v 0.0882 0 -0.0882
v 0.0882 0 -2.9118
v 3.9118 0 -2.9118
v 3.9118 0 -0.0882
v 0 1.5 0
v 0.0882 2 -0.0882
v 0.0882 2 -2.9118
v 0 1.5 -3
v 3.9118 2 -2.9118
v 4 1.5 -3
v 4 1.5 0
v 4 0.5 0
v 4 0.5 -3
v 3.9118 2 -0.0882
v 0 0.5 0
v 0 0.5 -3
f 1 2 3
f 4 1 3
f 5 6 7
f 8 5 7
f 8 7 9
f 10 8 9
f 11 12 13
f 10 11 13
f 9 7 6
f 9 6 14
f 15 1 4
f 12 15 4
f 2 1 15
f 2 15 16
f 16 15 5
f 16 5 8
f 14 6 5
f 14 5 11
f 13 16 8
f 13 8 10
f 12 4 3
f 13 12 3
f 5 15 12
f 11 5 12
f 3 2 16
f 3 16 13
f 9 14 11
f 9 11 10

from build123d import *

# Parameters (mm, degrees)
ESQUISSE1_W             = 4
ESQUISSE1_H             = 3
EXTRUSION1_DEPTH        = 2
CHANFREIN1_SIZE         = 0.5
CHANFREIN1_SIZE2        = 0.08816349
CHANFREIN2_SIZE         = 0.5
CHANFREIN2_SIZE2        = 0.08816349
CHANFREIN3_SIZE         = 0.5
CHANFREIN3_SIZE2        = 0.08816349
CHANFREIN3_PART_2_SIZE  = 0.5
CHANFREIN3_PART_2_SIZE2 = 0.08816349
CHANFREIN4_SIZE         = 0.5
CHANFREIN4_SIZE2        = 0.08816349
CHANFREIN5_SIZE         = 0.5
CHANFREIN5_SIZE2        = 0.08816349
CHANFREIN5_PART_2_SIZE  = 0.5
CHANFREIN5_PART_2_SIZE2 = 0.08816349
CHANFREIN5_PART_3_SIZE  = 0.5
CHANFREIN5_PART_3_SIZE2 = 0.08816349


with BuildPart() as part:
    # Esquisse1 → Extrusion1 (new body)
    with BuildSketch(Plane(origin=(0, 0, 0), x_dir=(1, 0, 0), z_dir=(0, 1, 0))):
        with Locations((2, 1.5)):
            Rectangle(ESQUISSE1_W, ESQUISSE1_H)
    extrude(amount=EXTRUSION1_DEPTH)

    # Chanfrein1
    chanfrein1_edges = [part.edges().sort_by_distance(p)[0] for p in [
        (4, 2, -1.5),
    ]]
    chanfrein1_side = [part.faces().sort_by_distance(p)[0] for p in [
        (4, 1, -1.5),
    ]]
    chamfer(chanfrein1_edges, length=CHANFREIN1_SIZE, length2=CHANFREIN1_SIZE2, reference=chanfrein1_side[0])

    # Chanfrein2
    chanfrein2_edges = [part.edges().sort_by_distance(p)[0] for p in [
        (0, 2, -1.5),
    ]]
    chanfrein2_side = [part.faces().sort_by_distance(p)[0] for p in [
        (0, 1, -1.5),
    ]]
    chamfer(chanfrein2_edges, length=CHANFREIN2_SIZE, length2=CHANFREIN2_SIZE2, reference=chanfrein2_side[0])

    # Chanfrein3
    chanfrein3_edges = [part.edges().sort_by_distance(p)[0] for p in [
        (2, 2, -3),
    ]]
    chanfrein3_side = [part.faces().sort_by_distance(p)[0] for p in [
        (2, 0.995382709, -3),
    ]]
    chamfer(chanfrein3_edges, length=CHANFREIN3_SIZE, length2=CHANFREIN3_SIZE2, reference=chanfrein3_side[0])

    # Chanfrein3 part 2
    chanfrein3_part_2_edges = [part.edges().sort_by_distance(p)[0] for p in [
        (2, 2, 0),
    ]]
    chanfrein3_part_2_side = [part.faces().sort_by_distance(p)[0] for p in [
        (2, 0.995382709, 0),
    ]]
    chamfer(chanfrein3_part_2_edges, length=CHANFREIN3_PART_2_SIZE, length2=CHANFREIN3_PART_2_SIZE2, reference=chanfrein3_part_2_side[0])

    # Chanfrein4
    chanfrein4_edges = [part.edges().sort_by_distance(p)[0] for p in [
        (4, 0, -1.5),
    ]]
    chanfrein4_side = [part.faces().sort_by_distance(p)[0] for p in [
        (4, 0.75, -1.5),
    ]]
    chamfer(chanfrein4_edges, length=CHANFREIN4_SIZE, length2=CHANFREIN4_SIZE2, reference=chanfrein4_side[0])

    # Chanfrein5
    chanfrein5_edges = [part.edges().sort_by_distance(p)[0] for p in [
        (1.955918255, 0, -3),
    ]]
    chanfrein5_side = [part.faces().sort_by_distance(p)[0] for p in [
        (1.992734308, 0.752150763, -3),
    ]]
    chamfer(chanfrein5_edges, length=CHANFREIN5_SIZE, length2=CHANFREIN5_SIZE2, reference=chanfrein5_side[0])

    # Chanfrein5 part 2
    chanfrein5_part_2_edges = [part.edges().sort_by_distance(p)[0] for p in [
        (0, 0, -1.5),
    ]]
    chanfrein5_part_2_side = [part.faces().sort_by_distance(p)[0] for p in [
        (0, 0.75, -1.5),
    ]]
    chamfer(chanfrein5_part_2_edges, length=CHANFREIN5_PART_2_SIZE, length2=CHANFREIN5_PART_2_SIZE2, reference=chanfrein5_part_2_side[0])

    # Chanfrein5 part 3
    chanfrein5_part_3_edges = [part.edges().sort_by_distance(p)[0] for p in [
        (1.955918255, 0, 0),
    ]]
    chanfrein5_part_3_side = [part.faces().sort_by_distance(p)[0] for p in [
        (1.992734308, 0.752150763, 0),
    ]]
    chamfer(chanfrein5_part_3_edges, length=CHANFREIN5_PART_3_SIZE, length2=CHANFREIN5_PART_3_SIZE2, reference=chanfrein5_part_3_side[0])


solid = part.part
